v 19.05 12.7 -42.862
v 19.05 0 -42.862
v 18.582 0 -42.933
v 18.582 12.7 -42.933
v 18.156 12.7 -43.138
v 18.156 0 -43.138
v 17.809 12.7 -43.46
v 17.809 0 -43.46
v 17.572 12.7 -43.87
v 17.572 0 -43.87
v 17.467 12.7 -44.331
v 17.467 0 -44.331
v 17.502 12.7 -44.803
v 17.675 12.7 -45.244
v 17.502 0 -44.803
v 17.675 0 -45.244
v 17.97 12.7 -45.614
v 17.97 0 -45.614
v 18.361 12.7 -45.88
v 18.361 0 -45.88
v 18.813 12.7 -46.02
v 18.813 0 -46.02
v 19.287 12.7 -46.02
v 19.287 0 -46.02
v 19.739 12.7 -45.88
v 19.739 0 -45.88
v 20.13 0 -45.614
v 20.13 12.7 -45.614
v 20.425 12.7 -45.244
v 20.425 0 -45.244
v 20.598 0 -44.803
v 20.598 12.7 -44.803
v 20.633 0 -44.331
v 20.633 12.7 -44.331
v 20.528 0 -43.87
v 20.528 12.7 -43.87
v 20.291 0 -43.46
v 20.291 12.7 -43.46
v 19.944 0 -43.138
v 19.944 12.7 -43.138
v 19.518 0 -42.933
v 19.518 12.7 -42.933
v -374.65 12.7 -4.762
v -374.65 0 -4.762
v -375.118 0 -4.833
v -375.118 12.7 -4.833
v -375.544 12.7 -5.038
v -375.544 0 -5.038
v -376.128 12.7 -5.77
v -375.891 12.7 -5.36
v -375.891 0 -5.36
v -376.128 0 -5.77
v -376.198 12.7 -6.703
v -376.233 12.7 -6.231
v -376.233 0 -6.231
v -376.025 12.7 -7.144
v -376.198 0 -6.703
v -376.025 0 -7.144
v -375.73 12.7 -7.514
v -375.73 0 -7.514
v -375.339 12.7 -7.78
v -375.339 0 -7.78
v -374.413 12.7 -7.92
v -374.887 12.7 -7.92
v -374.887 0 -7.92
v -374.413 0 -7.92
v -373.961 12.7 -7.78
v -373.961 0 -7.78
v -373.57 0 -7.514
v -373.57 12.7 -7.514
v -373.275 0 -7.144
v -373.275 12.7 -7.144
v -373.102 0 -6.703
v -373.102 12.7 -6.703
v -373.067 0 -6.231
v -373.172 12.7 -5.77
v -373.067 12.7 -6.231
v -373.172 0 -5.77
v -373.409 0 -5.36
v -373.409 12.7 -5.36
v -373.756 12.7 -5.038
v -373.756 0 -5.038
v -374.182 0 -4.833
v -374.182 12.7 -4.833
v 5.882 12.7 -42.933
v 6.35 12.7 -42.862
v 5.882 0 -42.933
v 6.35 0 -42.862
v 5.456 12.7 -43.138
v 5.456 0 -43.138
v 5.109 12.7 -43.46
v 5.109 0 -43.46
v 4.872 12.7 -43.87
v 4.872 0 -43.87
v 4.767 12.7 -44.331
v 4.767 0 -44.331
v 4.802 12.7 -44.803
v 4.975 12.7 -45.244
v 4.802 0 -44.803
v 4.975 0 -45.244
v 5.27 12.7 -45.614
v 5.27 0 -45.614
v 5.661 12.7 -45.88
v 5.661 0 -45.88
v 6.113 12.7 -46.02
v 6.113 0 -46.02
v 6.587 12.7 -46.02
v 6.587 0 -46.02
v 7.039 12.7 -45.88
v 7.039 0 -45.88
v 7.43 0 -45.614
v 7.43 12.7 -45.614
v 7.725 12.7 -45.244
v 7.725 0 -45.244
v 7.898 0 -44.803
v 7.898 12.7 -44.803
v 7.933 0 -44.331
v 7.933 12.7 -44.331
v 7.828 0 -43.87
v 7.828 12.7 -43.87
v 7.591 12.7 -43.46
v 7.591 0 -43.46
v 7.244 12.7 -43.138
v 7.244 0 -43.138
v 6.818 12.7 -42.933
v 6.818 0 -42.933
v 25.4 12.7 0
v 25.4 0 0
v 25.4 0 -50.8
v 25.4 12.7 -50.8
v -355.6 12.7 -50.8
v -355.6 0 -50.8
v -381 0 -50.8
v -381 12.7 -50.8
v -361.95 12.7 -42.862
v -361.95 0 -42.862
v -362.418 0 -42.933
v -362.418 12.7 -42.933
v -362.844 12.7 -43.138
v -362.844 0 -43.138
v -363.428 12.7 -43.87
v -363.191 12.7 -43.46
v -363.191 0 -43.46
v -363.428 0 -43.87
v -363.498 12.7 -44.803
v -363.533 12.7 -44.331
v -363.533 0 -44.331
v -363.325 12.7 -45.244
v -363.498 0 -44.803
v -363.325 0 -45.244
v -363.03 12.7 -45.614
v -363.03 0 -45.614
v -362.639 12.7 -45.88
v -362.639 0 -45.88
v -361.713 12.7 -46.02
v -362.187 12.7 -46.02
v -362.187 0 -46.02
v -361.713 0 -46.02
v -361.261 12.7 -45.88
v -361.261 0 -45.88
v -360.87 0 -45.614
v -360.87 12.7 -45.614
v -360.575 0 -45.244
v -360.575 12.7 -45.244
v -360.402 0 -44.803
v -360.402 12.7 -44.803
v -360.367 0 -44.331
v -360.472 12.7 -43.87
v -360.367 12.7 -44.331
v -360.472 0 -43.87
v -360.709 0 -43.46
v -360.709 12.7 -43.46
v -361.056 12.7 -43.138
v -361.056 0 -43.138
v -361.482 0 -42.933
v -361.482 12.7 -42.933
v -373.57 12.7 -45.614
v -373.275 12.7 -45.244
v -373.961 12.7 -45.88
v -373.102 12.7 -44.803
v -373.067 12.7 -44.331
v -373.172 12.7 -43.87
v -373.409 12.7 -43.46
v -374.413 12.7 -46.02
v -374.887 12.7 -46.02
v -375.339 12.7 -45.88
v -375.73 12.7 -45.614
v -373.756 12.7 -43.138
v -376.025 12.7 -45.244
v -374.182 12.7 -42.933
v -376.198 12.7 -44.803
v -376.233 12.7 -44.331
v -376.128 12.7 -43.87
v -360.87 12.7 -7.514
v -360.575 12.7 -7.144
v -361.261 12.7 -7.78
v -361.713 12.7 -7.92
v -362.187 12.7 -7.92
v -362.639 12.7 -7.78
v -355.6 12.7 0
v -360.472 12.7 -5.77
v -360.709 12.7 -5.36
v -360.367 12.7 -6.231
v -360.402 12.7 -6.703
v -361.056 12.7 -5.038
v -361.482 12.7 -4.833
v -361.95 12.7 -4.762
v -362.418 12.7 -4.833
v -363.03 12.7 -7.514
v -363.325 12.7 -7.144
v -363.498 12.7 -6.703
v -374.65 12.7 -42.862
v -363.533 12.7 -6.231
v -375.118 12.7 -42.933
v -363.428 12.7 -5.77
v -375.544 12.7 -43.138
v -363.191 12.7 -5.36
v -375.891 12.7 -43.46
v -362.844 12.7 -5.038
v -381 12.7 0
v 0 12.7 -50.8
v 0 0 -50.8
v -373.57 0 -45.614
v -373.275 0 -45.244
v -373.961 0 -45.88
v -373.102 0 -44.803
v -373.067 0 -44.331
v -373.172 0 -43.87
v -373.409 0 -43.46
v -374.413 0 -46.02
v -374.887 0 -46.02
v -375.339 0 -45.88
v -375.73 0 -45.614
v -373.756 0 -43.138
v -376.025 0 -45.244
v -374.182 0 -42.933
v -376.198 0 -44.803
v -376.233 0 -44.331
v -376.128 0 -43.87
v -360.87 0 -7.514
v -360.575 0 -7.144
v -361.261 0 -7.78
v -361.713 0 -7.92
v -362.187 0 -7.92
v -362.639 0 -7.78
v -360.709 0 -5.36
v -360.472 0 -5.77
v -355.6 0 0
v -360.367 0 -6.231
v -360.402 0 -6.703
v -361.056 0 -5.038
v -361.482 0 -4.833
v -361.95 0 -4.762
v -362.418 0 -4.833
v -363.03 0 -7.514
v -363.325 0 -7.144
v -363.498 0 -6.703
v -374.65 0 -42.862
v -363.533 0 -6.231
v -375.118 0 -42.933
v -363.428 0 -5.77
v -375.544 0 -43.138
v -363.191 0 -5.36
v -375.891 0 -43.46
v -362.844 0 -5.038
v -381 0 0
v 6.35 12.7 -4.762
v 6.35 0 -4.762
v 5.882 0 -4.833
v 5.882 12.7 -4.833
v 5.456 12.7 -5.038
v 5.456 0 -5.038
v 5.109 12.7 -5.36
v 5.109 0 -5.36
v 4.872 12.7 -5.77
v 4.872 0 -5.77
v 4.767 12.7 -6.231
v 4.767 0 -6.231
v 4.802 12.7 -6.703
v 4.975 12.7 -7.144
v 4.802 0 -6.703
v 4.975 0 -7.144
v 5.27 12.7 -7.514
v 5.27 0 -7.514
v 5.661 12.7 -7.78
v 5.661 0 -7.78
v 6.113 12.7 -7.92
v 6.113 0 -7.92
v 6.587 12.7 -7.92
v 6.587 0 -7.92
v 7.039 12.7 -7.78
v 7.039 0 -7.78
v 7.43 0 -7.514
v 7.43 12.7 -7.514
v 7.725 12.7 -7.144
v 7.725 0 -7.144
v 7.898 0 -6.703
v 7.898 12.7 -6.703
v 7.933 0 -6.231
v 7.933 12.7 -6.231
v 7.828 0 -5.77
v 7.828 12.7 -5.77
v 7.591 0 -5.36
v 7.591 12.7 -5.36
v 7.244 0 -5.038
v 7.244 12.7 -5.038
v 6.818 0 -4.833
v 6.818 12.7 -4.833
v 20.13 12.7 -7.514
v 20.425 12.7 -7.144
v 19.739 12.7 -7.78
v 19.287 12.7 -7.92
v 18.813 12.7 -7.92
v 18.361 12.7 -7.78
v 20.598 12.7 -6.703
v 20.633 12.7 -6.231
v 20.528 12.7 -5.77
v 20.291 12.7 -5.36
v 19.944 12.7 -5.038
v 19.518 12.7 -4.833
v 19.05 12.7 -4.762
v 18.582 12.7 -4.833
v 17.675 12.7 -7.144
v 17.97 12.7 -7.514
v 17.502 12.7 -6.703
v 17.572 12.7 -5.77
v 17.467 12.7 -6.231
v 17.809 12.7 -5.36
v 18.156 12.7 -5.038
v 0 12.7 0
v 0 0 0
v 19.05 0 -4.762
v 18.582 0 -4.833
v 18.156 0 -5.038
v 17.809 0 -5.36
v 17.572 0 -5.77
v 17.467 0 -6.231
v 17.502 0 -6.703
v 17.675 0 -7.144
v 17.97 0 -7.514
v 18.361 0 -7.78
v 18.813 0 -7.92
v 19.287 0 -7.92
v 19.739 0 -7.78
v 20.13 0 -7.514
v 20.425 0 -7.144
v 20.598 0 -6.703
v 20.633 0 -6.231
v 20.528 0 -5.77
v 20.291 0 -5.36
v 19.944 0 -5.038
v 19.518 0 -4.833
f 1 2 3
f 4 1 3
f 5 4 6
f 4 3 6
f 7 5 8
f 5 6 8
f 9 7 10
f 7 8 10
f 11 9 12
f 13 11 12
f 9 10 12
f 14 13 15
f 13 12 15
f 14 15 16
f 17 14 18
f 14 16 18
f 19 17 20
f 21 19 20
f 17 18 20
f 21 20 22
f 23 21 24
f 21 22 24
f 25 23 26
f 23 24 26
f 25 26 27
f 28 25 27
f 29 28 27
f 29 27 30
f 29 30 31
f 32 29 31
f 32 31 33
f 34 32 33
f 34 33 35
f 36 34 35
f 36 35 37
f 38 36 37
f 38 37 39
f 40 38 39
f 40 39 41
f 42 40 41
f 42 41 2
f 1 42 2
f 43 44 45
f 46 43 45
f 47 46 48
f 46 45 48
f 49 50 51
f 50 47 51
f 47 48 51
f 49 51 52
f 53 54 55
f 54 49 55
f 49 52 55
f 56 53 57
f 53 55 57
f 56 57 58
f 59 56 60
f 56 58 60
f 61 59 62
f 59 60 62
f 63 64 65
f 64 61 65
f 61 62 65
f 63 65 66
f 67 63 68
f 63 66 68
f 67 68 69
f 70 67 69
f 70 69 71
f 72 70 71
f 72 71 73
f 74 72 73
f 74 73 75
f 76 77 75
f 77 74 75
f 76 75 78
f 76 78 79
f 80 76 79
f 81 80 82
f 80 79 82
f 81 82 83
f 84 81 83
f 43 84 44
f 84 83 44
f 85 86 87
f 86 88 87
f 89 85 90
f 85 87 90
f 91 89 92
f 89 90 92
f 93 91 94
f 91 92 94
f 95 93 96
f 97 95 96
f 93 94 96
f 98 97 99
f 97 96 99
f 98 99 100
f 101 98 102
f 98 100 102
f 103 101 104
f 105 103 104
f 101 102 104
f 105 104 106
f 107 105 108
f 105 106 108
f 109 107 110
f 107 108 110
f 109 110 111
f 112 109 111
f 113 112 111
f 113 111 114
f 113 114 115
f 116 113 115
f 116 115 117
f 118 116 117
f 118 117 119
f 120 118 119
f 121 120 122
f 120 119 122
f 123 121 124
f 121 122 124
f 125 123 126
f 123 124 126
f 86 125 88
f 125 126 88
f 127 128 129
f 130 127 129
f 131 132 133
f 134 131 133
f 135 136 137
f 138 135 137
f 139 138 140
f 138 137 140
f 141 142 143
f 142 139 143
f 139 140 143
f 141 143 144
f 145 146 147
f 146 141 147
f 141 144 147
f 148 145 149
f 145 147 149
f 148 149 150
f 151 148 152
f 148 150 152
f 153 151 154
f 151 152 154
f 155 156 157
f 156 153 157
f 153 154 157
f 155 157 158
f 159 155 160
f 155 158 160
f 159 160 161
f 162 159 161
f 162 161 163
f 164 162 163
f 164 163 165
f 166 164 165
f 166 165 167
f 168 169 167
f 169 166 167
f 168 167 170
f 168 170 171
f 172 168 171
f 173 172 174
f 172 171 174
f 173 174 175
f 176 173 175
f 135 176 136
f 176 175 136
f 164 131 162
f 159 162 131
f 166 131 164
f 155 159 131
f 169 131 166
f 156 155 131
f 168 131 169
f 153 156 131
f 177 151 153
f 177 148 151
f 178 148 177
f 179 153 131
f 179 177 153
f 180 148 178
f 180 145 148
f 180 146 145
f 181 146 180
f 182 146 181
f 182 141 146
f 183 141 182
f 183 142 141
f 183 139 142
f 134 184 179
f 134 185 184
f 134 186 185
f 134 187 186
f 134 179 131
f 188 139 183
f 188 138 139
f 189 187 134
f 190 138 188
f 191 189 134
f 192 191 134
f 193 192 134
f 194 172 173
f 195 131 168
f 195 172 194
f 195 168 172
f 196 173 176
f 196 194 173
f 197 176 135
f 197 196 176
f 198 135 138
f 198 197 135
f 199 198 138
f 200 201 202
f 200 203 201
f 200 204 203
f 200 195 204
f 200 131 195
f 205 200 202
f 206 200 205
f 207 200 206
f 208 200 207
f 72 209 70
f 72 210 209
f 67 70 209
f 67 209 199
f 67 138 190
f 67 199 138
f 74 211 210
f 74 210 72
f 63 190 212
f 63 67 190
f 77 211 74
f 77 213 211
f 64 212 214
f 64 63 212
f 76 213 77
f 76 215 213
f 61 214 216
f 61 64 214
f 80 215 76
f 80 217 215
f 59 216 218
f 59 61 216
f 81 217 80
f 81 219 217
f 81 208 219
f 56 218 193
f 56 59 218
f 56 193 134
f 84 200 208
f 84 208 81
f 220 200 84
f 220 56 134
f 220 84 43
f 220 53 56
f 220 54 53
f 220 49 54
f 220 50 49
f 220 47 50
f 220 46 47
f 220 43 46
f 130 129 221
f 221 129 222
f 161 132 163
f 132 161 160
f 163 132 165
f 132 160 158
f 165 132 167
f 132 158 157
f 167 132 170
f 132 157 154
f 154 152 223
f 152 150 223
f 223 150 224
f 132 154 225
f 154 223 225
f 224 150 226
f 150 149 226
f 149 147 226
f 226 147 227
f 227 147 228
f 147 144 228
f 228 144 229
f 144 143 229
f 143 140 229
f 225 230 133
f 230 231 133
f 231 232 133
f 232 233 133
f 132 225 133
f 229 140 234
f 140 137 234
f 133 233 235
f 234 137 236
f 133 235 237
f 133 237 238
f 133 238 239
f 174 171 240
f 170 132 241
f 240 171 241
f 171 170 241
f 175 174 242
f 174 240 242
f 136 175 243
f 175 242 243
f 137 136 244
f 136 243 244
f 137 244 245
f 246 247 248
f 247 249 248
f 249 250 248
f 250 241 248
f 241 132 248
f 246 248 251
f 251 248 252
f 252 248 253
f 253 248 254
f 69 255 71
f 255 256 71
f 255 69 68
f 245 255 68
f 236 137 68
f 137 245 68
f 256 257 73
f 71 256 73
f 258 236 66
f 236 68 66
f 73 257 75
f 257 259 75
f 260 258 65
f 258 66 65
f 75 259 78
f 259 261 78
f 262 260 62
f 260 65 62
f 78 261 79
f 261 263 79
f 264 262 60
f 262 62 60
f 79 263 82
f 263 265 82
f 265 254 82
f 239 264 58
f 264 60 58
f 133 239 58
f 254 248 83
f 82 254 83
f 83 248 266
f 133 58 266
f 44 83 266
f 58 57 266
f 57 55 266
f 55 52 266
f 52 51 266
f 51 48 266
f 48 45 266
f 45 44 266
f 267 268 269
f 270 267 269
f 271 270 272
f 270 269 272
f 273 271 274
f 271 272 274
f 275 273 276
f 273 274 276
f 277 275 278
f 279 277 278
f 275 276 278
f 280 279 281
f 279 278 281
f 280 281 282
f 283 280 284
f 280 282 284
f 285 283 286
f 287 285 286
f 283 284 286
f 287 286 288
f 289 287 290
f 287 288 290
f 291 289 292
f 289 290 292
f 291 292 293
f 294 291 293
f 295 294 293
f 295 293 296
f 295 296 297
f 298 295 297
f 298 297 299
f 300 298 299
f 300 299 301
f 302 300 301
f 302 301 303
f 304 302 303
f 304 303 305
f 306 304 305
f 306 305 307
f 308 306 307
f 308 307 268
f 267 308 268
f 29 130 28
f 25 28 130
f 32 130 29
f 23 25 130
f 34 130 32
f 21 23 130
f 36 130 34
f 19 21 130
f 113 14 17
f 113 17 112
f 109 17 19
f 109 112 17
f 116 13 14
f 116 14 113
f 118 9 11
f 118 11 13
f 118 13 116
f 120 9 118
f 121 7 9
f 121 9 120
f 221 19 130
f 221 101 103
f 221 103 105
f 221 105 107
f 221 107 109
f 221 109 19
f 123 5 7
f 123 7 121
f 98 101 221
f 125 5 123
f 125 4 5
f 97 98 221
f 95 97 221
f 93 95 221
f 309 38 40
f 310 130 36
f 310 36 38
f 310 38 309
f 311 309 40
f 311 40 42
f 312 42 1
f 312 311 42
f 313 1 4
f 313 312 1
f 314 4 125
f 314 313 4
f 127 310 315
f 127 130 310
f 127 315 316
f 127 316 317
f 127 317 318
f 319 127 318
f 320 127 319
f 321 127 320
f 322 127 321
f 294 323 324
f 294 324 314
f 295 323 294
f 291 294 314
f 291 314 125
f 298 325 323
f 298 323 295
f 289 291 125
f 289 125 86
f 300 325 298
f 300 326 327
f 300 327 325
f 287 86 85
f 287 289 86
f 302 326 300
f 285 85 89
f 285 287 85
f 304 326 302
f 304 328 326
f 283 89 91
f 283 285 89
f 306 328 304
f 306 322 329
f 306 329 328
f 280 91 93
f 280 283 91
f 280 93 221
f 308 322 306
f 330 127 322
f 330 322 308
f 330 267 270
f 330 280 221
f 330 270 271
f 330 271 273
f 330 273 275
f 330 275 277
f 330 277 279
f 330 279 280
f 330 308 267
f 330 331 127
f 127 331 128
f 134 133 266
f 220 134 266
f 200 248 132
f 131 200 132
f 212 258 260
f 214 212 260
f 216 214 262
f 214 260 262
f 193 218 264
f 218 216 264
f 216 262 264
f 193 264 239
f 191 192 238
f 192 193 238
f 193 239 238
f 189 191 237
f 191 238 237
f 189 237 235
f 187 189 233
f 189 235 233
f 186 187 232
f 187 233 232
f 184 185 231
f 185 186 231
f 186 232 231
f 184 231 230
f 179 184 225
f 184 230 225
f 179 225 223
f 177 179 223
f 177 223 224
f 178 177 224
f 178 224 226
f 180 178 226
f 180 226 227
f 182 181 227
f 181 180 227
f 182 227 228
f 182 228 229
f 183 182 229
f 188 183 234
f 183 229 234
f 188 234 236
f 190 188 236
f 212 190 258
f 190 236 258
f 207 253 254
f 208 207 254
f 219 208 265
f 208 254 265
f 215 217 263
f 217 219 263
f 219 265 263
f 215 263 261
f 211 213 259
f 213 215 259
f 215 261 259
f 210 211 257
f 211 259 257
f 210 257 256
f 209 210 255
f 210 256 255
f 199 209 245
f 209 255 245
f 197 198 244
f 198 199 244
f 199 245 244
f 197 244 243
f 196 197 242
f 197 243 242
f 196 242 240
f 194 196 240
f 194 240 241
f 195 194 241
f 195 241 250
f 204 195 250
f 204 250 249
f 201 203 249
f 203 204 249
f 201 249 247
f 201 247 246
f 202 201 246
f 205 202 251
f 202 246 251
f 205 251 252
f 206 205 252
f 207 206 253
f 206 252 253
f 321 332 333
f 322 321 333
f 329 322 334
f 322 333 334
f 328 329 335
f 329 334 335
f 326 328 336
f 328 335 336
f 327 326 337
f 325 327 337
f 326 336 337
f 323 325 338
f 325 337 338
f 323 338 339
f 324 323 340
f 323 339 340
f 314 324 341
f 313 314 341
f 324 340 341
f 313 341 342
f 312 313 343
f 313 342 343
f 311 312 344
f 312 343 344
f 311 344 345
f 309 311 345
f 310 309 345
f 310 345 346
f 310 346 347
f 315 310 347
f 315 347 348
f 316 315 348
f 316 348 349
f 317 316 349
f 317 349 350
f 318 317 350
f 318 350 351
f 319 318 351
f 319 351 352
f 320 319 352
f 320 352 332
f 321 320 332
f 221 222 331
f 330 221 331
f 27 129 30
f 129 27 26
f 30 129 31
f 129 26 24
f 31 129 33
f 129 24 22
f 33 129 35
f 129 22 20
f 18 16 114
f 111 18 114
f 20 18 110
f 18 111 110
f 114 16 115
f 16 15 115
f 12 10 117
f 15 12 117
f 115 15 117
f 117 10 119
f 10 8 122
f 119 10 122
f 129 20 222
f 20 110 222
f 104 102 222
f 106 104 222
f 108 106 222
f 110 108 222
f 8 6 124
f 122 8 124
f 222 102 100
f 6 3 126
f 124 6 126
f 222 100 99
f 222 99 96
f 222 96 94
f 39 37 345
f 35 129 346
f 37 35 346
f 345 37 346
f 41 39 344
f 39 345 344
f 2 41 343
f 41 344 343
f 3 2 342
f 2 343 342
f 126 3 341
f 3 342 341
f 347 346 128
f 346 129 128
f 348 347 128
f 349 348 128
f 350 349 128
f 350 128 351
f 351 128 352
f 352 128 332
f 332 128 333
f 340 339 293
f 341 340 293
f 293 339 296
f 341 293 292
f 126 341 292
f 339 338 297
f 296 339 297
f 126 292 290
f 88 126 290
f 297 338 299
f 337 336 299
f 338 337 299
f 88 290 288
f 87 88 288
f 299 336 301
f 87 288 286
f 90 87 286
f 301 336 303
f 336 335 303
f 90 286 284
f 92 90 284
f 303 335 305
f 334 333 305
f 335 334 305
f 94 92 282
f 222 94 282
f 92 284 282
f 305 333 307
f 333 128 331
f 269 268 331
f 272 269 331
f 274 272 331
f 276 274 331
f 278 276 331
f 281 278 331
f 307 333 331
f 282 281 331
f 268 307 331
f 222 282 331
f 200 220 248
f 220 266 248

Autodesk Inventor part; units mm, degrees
ref_plane "YZ Plane" through (0, 0, 0) normal (1, 0, 0) x (0, 1, 0)
ref_plane "XZ Plane" through (0, 0, 0) normal (0, 1, 0) x (-1, 0, 0)
sketch "Sketch2" plane through (0, 0, 0) normal (0, 1, 0) x (-1, 0, 0)
  line L0 (0, 0) -> (-25.4, 0)
  line L1 (-25.4, 0) -> (-25.4, -50.8)
  line L2 (-25.4, -50.8) -> (0, -50.8)
  line L3 (0, -50.8) -> (0, 0)
  dimension "d0" = 50.8
  dimension "d4" = 25.4
extrude "Extrusion1" add sketch "Sketch2" along normal blind 12.7
sketch "Sketch4" plane through (0, 12.7, 0) normal (0, 1, 0) x (1, 0, 0)
  line L0 (6.35, 6.35) -> (19.05, 6.35) construction
  line L1 (19.05, 6.35) -> (19.05, 44.45) construction
  line L2 (19.05, 44.45) -> (6.35, 44.45) construction
  line L3 (6.35, 44.45) -> (6.35, 6.35) construction
  line L4 (0, 50.8) -> (0, 0) construction
  line L5 (25.4, 50.8) -> (0, 50.8) construction
  line L6 (0, 0) -> (25.4, 0) construction
  line L7 (25.4, 0) -> (25.4, 50.8) construction
  dimension "d5" = 6.35
  dimension "d6" = 6.35
  dimension "d7" = 6.35
  dimension "d8" = 6.35
hole "Hole1" at (6.35, 12.7, -6.35) at (19.05, 12.7, -6.35) at (19.05, 12.7, -44.45) at (6.35, 12.7, -44.45) direction (0, -1, 0) diameter 3.175 end through all
ref_plane "Work Plane1" through (-177.8, 0, -50.8) normal (-1, 0, 0) x (0, 0, 1)
mirror "Mirror1" about plane through (-177.8, 0, -50.8) normal (-1, 0, 0)
properties part number "Intake - Lexan Raiser  inner"
